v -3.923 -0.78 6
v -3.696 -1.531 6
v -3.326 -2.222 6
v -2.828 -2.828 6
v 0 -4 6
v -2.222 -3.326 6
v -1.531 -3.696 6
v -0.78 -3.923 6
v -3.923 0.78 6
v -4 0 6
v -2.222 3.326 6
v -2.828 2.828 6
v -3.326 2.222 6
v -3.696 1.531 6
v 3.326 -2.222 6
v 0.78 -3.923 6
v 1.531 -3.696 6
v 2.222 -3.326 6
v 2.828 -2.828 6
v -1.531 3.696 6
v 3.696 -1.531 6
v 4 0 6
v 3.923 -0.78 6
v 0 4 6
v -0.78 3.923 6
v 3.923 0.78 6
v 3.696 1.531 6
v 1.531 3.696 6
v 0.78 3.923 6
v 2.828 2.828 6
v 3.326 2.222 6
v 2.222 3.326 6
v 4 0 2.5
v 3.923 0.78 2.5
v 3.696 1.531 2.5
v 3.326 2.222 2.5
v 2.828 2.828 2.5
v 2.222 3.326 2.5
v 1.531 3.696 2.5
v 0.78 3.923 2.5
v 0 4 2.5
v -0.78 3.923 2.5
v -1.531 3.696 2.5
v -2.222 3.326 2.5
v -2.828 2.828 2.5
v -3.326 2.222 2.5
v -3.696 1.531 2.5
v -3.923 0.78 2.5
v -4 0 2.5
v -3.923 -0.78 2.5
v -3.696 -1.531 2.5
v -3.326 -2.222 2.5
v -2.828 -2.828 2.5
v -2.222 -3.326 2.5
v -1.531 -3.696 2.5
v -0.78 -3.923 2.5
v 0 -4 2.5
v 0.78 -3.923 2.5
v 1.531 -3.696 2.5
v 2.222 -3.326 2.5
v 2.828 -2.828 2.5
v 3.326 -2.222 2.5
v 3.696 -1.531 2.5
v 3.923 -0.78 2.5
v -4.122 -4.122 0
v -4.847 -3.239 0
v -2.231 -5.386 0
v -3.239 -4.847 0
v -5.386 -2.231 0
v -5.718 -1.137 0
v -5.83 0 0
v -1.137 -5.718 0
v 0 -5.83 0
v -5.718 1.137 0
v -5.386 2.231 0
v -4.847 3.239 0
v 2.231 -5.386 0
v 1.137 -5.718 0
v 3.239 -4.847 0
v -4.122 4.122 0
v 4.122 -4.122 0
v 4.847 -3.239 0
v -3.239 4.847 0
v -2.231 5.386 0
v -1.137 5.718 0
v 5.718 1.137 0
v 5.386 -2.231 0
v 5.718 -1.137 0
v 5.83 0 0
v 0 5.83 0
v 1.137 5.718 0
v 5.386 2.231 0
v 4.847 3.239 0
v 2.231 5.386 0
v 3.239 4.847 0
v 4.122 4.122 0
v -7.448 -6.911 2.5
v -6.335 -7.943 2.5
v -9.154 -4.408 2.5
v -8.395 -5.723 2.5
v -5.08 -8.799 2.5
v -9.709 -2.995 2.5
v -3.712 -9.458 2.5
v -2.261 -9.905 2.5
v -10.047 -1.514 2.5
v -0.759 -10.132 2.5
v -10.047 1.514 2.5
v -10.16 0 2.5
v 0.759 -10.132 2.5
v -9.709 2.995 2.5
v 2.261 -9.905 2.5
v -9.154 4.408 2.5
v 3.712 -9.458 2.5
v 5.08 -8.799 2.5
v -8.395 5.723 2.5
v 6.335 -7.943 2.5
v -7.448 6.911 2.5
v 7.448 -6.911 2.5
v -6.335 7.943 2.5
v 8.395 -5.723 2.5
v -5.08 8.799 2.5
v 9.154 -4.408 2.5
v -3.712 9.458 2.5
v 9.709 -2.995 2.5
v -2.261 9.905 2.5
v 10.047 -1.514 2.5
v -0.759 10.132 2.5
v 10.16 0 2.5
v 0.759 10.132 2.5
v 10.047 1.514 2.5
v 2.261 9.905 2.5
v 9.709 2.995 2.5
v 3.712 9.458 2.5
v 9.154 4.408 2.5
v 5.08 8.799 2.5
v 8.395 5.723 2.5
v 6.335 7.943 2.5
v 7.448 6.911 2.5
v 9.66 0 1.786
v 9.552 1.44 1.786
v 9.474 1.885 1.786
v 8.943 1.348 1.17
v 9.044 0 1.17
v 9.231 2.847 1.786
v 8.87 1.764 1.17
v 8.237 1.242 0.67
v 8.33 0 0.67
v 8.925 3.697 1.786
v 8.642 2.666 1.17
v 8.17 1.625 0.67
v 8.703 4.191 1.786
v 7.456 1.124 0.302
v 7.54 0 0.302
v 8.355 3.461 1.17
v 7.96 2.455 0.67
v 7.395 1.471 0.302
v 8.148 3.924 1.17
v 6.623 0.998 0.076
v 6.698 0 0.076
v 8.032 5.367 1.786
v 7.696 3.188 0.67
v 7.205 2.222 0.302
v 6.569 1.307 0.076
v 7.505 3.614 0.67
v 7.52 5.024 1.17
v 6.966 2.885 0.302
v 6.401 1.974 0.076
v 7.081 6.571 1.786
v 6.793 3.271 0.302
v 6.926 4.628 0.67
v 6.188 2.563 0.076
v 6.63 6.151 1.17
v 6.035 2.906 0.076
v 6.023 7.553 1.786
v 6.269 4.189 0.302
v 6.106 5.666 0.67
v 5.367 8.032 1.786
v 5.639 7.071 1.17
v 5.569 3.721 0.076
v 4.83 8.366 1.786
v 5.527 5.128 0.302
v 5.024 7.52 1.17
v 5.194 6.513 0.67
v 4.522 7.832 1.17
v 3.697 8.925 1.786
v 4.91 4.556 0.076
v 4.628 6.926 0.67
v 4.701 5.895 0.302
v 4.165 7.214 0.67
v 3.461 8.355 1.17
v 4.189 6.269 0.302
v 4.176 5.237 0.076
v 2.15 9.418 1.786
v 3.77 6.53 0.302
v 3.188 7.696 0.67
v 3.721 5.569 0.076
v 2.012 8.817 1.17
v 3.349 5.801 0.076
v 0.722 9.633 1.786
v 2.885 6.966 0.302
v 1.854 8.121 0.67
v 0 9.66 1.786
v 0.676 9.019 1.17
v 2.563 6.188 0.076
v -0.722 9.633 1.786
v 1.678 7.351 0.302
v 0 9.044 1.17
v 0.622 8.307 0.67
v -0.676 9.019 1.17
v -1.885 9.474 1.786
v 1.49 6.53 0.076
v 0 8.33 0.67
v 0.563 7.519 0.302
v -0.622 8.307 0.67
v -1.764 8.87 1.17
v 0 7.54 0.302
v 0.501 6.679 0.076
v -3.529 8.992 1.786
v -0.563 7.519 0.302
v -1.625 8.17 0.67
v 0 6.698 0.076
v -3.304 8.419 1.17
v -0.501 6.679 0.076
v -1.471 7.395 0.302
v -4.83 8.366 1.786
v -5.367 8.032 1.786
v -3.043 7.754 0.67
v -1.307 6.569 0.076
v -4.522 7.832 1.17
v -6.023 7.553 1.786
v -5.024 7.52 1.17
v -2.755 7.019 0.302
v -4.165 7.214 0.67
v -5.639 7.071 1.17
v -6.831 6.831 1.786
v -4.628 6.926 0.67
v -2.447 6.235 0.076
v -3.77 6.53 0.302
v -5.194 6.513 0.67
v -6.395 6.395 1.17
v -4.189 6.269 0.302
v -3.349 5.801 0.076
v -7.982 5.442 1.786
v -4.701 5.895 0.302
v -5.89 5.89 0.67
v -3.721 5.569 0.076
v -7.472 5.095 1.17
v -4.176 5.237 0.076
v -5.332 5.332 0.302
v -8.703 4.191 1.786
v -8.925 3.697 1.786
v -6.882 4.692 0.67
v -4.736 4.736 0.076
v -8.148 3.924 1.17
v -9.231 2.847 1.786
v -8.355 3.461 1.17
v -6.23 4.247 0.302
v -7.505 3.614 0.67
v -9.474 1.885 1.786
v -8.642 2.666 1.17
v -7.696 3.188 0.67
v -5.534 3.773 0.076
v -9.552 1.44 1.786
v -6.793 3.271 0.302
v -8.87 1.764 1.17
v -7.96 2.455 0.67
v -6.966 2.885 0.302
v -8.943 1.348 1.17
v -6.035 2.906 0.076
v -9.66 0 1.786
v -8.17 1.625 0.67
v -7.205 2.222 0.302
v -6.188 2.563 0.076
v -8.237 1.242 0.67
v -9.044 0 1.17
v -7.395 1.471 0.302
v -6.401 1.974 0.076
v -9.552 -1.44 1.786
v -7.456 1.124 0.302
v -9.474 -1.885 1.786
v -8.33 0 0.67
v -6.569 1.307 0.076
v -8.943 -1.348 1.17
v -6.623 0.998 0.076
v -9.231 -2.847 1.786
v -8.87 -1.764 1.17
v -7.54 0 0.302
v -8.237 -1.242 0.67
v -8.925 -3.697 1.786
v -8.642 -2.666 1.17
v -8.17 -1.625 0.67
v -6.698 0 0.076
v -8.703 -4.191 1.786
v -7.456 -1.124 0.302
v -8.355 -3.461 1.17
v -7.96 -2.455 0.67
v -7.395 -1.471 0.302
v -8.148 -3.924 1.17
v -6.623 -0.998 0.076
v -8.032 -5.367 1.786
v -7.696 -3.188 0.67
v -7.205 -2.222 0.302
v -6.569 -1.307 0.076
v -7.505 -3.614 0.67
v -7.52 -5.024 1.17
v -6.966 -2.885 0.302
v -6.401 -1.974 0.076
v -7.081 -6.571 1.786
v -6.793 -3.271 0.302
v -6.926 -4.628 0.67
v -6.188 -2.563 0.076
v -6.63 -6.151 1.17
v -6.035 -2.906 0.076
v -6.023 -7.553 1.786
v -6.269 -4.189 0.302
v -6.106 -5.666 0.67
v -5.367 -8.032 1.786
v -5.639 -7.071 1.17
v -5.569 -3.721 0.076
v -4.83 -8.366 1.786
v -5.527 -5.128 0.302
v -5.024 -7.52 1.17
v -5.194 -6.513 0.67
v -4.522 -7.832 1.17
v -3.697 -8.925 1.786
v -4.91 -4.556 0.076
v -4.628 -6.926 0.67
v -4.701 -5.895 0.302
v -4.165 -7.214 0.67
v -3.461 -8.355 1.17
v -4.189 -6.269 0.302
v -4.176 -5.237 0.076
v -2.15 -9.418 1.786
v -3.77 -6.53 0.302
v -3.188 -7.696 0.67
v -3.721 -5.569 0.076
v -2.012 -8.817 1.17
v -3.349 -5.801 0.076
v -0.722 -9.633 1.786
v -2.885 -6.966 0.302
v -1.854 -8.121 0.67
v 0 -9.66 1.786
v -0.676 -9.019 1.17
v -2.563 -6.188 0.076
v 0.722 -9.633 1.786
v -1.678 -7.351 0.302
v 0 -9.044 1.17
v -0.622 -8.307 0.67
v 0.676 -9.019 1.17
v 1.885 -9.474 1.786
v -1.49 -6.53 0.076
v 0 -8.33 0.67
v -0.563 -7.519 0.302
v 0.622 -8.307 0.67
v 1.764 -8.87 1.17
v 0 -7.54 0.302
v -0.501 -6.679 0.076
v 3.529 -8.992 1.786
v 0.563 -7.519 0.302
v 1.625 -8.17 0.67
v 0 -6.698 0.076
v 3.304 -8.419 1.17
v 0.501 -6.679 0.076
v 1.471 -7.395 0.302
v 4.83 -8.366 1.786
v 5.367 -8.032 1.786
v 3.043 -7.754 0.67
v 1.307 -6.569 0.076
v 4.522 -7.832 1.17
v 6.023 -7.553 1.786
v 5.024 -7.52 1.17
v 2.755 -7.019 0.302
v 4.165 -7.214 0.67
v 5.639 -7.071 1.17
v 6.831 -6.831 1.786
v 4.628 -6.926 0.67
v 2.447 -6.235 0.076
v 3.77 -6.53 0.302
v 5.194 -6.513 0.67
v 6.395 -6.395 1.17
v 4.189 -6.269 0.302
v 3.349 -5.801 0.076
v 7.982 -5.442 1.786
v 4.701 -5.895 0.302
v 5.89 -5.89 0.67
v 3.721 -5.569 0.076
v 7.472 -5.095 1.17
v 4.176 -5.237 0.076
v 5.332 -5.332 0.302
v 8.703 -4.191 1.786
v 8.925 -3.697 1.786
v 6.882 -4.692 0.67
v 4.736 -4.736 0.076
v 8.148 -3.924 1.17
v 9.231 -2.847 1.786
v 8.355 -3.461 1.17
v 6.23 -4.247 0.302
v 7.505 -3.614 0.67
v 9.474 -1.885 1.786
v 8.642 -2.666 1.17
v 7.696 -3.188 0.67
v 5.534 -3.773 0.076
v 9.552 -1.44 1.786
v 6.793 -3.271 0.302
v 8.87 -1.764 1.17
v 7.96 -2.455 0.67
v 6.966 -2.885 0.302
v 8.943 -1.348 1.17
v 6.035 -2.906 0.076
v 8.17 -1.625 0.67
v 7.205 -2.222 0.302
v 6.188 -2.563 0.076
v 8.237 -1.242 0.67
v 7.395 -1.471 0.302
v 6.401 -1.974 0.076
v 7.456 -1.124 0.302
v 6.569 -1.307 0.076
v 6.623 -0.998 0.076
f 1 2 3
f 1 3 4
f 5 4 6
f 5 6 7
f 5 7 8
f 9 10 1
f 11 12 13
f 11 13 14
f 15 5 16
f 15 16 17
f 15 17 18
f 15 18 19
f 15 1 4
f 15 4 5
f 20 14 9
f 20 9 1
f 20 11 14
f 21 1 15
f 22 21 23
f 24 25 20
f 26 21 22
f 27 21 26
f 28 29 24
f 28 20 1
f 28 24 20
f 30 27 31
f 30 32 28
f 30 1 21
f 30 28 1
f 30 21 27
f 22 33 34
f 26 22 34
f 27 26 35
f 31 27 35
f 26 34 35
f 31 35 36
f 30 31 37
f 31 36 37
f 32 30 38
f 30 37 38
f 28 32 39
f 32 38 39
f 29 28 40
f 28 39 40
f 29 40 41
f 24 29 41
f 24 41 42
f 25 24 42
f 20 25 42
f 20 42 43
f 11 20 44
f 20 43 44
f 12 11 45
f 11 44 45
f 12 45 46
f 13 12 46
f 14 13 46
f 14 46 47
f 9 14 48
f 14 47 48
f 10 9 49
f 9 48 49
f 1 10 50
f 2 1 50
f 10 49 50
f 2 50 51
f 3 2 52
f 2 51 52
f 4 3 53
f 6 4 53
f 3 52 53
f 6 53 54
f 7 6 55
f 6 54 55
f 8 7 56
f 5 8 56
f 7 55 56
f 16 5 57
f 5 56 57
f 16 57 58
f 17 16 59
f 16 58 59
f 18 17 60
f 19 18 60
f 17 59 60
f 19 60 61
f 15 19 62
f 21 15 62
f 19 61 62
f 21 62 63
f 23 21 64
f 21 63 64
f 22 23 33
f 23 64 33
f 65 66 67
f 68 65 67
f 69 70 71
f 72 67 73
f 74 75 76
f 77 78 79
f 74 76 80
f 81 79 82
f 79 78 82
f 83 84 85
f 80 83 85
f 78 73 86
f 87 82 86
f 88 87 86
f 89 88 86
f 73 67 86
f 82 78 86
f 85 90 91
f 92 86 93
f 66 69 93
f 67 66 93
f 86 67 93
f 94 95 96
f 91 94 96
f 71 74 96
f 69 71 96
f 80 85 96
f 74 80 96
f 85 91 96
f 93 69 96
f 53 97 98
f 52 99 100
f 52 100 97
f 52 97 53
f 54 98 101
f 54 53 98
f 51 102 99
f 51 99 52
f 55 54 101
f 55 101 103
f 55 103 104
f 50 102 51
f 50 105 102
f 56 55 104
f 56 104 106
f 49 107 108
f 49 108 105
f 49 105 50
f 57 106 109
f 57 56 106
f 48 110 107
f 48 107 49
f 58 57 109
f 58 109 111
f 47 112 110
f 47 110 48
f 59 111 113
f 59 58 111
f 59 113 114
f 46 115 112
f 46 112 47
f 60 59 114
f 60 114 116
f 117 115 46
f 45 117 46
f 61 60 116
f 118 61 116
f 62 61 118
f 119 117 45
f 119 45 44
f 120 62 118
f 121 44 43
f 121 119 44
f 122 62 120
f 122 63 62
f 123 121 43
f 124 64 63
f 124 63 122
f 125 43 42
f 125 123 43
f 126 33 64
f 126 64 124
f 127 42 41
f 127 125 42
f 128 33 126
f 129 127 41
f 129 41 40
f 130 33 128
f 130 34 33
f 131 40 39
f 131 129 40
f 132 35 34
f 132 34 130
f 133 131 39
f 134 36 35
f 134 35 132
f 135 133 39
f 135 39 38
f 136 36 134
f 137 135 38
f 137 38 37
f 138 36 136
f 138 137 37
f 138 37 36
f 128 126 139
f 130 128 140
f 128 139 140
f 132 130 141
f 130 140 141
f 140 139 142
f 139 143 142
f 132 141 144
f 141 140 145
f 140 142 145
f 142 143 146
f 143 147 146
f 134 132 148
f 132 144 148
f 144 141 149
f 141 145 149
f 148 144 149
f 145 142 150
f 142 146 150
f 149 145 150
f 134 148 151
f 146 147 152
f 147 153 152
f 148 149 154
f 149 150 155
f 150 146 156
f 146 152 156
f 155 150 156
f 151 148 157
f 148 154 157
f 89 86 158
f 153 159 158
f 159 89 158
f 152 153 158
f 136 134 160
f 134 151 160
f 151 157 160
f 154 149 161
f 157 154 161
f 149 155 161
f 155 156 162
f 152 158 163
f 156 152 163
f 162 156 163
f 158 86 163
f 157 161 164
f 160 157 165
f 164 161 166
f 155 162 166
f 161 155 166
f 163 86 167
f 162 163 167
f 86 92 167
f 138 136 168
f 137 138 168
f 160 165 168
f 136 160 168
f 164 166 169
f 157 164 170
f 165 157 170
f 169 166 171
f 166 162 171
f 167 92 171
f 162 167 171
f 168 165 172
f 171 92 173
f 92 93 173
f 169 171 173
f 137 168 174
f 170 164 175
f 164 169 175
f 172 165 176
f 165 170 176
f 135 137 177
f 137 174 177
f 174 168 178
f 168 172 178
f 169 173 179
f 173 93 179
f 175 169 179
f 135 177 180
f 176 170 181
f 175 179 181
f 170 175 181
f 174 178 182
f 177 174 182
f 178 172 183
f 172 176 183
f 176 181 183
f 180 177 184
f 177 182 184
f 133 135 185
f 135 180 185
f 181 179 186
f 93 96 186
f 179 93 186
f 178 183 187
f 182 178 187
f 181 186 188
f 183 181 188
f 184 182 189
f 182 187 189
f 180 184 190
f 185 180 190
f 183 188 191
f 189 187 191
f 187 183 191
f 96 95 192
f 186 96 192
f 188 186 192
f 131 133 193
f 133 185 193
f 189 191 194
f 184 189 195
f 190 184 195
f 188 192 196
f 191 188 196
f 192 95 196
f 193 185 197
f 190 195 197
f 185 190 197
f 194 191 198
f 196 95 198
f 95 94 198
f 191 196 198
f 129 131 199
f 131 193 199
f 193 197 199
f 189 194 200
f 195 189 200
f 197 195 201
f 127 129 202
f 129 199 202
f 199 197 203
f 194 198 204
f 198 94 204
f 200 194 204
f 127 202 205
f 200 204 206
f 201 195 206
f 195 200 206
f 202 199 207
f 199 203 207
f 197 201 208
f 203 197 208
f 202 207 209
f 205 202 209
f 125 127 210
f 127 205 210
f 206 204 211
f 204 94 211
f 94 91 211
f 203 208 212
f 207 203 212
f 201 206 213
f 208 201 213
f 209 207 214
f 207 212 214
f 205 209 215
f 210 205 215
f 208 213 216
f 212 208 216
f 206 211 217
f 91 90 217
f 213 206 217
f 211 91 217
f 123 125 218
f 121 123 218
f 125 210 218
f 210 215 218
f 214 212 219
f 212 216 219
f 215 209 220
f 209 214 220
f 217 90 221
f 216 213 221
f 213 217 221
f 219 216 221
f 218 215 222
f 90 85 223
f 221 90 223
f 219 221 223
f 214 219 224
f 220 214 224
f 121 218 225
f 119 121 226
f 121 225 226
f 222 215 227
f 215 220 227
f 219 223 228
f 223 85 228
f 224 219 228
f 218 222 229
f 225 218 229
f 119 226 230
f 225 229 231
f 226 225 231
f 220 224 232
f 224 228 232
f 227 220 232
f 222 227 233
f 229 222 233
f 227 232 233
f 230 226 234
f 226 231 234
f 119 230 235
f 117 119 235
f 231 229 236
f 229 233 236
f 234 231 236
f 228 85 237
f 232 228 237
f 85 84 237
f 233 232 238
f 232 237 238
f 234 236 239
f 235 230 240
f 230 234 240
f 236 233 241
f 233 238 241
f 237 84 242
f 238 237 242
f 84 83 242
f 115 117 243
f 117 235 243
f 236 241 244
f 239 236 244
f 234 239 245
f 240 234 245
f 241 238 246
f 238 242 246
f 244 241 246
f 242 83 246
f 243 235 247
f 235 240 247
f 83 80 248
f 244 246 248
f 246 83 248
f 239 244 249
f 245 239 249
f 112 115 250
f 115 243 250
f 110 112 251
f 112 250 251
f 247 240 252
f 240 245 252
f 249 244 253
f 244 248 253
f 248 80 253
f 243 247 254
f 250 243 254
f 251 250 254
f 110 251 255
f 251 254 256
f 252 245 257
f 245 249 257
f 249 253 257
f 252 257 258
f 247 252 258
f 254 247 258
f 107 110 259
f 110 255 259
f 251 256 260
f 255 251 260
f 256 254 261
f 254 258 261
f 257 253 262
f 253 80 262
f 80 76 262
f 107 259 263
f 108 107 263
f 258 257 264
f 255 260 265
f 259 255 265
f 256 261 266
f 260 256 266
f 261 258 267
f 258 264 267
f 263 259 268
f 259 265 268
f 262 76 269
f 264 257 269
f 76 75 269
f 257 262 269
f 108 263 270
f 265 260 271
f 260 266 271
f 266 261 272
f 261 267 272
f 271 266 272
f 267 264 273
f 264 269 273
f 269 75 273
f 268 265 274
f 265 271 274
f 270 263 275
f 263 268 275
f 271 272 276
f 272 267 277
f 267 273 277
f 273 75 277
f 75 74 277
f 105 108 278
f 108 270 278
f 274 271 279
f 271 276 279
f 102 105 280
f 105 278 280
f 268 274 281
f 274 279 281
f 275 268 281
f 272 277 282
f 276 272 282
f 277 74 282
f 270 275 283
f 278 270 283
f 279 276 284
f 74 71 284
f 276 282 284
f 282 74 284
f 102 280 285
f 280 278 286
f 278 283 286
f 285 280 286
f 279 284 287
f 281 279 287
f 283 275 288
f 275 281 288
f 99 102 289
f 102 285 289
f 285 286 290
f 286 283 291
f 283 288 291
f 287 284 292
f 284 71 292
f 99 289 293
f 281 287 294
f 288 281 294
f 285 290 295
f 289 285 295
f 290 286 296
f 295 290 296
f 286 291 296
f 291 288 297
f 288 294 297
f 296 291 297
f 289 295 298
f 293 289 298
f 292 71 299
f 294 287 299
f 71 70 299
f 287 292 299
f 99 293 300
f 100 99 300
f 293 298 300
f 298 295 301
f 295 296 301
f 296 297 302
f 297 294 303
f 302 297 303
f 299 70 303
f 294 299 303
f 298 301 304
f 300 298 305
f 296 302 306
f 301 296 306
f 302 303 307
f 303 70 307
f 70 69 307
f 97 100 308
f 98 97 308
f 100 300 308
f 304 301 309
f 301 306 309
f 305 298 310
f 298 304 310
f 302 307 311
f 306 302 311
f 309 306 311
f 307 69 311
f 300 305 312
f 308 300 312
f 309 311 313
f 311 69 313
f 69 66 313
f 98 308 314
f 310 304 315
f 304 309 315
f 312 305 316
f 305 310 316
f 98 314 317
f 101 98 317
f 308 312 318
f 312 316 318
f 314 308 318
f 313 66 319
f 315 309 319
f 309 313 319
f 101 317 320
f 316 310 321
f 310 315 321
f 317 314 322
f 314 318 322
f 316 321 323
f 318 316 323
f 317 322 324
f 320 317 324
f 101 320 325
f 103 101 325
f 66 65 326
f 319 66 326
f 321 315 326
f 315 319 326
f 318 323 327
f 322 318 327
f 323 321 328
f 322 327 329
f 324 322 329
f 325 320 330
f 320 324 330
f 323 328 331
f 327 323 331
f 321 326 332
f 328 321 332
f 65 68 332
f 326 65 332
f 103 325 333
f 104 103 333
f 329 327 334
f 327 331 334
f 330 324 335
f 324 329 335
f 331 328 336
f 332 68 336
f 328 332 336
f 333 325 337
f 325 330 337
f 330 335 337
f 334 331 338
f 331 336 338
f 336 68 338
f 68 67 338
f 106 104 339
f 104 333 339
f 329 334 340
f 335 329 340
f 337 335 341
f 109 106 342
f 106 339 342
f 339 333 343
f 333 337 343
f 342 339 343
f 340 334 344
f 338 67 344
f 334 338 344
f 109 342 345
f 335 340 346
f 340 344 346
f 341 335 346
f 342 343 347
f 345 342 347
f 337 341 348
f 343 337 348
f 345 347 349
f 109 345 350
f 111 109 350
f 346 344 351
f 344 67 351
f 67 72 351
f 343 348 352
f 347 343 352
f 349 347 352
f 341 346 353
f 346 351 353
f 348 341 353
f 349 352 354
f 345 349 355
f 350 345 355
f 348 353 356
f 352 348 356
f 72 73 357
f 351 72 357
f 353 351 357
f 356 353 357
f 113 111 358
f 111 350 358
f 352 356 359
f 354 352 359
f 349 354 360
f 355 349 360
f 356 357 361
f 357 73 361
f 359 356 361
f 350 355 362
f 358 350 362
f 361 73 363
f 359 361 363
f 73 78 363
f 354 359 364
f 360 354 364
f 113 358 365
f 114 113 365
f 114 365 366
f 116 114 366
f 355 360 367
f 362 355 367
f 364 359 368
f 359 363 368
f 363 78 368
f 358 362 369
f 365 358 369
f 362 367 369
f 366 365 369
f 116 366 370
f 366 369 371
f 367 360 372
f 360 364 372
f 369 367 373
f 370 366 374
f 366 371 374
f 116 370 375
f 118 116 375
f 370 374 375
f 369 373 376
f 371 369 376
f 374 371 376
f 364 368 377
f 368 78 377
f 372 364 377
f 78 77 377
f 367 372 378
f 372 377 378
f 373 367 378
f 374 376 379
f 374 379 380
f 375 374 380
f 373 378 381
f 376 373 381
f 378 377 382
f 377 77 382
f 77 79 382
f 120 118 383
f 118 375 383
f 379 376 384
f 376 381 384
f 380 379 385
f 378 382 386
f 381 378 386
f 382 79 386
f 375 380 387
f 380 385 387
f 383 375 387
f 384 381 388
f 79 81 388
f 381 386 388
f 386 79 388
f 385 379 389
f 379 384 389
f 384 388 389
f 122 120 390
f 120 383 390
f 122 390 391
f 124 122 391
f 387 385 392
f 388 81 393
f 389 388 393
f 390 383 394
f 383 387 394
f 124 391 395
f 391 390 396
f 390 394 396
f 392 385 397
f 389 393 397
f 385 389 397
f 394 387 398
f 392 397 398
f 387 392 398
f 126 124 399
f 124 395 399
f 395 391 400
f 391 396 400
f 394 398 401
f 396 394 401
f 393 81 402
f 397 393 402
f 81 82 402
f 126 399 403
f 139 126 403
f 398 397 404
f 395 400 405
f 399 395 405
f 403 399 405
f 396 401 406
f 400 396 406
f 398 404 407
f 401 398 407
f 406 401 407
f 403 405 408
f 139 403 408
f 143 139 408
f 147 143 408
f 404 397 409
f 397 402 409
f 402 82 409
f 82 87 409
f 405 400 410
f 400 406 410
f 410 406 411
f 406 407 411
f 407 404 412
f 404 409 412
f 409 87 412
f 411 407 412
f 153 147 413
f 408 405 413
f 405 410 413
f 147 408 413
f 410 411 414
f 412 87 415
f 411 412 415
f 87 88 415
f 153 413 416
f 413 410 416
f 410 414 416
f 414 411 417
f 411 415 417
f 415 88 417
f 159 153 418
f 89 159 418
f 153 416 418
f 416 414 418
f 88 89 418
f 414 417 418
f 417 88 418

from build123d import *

# Parameters (mm, degrees)
F0_R     = 10.16
F1_DEPTH = 2.5
F2_R     = 4
F3_DEPTH = 3.5


# Not quite as in the source:
# - a fillet or chamfer that OpenCascade refuses, or shapes differently, is made with other operations: its cross-section is extruded or revolved along the edge and cut away or added


with BuildPart() as f1:
    # F0 (on Top) → F1 (new body)
    with BuildSketch(Plane.XY):
        Circle(F0_R)
    extrude(amount=F1_DEPTH)

    # F2 (on face) → F3 (join)
    with BuildSketch(Plane.XY.offset(2.5)):
        Circle(F2_R)
    extrude(amount=F3_DEPTH)

    # F4: fillet of radius 5 on 1 edges, made by hand

    # F4_s1 → F4_t2 (revolve, cut)
    with BuildSketch(Plane.XZ):
        with BuildLine():
            ThreePointArc((10.16, 2.5), (8.3298729811, 0.6698729811), (5.8298729811, 0))
            Line((5.8298729811, 0), (10.16, 0))
            Line((10.16, 0), (10.16, 2.5))
        make_face()
    revolve(axis=Axis((0, 0, 0), (0, 0, 1)), mode=Mode.SUBTRACT)

    # F5: F1 across plane


with BuildPart() as f1_1:
    add(f1.part)
    add(f1.part.mirror(Plane.XZ))


solid = f1_1.part
